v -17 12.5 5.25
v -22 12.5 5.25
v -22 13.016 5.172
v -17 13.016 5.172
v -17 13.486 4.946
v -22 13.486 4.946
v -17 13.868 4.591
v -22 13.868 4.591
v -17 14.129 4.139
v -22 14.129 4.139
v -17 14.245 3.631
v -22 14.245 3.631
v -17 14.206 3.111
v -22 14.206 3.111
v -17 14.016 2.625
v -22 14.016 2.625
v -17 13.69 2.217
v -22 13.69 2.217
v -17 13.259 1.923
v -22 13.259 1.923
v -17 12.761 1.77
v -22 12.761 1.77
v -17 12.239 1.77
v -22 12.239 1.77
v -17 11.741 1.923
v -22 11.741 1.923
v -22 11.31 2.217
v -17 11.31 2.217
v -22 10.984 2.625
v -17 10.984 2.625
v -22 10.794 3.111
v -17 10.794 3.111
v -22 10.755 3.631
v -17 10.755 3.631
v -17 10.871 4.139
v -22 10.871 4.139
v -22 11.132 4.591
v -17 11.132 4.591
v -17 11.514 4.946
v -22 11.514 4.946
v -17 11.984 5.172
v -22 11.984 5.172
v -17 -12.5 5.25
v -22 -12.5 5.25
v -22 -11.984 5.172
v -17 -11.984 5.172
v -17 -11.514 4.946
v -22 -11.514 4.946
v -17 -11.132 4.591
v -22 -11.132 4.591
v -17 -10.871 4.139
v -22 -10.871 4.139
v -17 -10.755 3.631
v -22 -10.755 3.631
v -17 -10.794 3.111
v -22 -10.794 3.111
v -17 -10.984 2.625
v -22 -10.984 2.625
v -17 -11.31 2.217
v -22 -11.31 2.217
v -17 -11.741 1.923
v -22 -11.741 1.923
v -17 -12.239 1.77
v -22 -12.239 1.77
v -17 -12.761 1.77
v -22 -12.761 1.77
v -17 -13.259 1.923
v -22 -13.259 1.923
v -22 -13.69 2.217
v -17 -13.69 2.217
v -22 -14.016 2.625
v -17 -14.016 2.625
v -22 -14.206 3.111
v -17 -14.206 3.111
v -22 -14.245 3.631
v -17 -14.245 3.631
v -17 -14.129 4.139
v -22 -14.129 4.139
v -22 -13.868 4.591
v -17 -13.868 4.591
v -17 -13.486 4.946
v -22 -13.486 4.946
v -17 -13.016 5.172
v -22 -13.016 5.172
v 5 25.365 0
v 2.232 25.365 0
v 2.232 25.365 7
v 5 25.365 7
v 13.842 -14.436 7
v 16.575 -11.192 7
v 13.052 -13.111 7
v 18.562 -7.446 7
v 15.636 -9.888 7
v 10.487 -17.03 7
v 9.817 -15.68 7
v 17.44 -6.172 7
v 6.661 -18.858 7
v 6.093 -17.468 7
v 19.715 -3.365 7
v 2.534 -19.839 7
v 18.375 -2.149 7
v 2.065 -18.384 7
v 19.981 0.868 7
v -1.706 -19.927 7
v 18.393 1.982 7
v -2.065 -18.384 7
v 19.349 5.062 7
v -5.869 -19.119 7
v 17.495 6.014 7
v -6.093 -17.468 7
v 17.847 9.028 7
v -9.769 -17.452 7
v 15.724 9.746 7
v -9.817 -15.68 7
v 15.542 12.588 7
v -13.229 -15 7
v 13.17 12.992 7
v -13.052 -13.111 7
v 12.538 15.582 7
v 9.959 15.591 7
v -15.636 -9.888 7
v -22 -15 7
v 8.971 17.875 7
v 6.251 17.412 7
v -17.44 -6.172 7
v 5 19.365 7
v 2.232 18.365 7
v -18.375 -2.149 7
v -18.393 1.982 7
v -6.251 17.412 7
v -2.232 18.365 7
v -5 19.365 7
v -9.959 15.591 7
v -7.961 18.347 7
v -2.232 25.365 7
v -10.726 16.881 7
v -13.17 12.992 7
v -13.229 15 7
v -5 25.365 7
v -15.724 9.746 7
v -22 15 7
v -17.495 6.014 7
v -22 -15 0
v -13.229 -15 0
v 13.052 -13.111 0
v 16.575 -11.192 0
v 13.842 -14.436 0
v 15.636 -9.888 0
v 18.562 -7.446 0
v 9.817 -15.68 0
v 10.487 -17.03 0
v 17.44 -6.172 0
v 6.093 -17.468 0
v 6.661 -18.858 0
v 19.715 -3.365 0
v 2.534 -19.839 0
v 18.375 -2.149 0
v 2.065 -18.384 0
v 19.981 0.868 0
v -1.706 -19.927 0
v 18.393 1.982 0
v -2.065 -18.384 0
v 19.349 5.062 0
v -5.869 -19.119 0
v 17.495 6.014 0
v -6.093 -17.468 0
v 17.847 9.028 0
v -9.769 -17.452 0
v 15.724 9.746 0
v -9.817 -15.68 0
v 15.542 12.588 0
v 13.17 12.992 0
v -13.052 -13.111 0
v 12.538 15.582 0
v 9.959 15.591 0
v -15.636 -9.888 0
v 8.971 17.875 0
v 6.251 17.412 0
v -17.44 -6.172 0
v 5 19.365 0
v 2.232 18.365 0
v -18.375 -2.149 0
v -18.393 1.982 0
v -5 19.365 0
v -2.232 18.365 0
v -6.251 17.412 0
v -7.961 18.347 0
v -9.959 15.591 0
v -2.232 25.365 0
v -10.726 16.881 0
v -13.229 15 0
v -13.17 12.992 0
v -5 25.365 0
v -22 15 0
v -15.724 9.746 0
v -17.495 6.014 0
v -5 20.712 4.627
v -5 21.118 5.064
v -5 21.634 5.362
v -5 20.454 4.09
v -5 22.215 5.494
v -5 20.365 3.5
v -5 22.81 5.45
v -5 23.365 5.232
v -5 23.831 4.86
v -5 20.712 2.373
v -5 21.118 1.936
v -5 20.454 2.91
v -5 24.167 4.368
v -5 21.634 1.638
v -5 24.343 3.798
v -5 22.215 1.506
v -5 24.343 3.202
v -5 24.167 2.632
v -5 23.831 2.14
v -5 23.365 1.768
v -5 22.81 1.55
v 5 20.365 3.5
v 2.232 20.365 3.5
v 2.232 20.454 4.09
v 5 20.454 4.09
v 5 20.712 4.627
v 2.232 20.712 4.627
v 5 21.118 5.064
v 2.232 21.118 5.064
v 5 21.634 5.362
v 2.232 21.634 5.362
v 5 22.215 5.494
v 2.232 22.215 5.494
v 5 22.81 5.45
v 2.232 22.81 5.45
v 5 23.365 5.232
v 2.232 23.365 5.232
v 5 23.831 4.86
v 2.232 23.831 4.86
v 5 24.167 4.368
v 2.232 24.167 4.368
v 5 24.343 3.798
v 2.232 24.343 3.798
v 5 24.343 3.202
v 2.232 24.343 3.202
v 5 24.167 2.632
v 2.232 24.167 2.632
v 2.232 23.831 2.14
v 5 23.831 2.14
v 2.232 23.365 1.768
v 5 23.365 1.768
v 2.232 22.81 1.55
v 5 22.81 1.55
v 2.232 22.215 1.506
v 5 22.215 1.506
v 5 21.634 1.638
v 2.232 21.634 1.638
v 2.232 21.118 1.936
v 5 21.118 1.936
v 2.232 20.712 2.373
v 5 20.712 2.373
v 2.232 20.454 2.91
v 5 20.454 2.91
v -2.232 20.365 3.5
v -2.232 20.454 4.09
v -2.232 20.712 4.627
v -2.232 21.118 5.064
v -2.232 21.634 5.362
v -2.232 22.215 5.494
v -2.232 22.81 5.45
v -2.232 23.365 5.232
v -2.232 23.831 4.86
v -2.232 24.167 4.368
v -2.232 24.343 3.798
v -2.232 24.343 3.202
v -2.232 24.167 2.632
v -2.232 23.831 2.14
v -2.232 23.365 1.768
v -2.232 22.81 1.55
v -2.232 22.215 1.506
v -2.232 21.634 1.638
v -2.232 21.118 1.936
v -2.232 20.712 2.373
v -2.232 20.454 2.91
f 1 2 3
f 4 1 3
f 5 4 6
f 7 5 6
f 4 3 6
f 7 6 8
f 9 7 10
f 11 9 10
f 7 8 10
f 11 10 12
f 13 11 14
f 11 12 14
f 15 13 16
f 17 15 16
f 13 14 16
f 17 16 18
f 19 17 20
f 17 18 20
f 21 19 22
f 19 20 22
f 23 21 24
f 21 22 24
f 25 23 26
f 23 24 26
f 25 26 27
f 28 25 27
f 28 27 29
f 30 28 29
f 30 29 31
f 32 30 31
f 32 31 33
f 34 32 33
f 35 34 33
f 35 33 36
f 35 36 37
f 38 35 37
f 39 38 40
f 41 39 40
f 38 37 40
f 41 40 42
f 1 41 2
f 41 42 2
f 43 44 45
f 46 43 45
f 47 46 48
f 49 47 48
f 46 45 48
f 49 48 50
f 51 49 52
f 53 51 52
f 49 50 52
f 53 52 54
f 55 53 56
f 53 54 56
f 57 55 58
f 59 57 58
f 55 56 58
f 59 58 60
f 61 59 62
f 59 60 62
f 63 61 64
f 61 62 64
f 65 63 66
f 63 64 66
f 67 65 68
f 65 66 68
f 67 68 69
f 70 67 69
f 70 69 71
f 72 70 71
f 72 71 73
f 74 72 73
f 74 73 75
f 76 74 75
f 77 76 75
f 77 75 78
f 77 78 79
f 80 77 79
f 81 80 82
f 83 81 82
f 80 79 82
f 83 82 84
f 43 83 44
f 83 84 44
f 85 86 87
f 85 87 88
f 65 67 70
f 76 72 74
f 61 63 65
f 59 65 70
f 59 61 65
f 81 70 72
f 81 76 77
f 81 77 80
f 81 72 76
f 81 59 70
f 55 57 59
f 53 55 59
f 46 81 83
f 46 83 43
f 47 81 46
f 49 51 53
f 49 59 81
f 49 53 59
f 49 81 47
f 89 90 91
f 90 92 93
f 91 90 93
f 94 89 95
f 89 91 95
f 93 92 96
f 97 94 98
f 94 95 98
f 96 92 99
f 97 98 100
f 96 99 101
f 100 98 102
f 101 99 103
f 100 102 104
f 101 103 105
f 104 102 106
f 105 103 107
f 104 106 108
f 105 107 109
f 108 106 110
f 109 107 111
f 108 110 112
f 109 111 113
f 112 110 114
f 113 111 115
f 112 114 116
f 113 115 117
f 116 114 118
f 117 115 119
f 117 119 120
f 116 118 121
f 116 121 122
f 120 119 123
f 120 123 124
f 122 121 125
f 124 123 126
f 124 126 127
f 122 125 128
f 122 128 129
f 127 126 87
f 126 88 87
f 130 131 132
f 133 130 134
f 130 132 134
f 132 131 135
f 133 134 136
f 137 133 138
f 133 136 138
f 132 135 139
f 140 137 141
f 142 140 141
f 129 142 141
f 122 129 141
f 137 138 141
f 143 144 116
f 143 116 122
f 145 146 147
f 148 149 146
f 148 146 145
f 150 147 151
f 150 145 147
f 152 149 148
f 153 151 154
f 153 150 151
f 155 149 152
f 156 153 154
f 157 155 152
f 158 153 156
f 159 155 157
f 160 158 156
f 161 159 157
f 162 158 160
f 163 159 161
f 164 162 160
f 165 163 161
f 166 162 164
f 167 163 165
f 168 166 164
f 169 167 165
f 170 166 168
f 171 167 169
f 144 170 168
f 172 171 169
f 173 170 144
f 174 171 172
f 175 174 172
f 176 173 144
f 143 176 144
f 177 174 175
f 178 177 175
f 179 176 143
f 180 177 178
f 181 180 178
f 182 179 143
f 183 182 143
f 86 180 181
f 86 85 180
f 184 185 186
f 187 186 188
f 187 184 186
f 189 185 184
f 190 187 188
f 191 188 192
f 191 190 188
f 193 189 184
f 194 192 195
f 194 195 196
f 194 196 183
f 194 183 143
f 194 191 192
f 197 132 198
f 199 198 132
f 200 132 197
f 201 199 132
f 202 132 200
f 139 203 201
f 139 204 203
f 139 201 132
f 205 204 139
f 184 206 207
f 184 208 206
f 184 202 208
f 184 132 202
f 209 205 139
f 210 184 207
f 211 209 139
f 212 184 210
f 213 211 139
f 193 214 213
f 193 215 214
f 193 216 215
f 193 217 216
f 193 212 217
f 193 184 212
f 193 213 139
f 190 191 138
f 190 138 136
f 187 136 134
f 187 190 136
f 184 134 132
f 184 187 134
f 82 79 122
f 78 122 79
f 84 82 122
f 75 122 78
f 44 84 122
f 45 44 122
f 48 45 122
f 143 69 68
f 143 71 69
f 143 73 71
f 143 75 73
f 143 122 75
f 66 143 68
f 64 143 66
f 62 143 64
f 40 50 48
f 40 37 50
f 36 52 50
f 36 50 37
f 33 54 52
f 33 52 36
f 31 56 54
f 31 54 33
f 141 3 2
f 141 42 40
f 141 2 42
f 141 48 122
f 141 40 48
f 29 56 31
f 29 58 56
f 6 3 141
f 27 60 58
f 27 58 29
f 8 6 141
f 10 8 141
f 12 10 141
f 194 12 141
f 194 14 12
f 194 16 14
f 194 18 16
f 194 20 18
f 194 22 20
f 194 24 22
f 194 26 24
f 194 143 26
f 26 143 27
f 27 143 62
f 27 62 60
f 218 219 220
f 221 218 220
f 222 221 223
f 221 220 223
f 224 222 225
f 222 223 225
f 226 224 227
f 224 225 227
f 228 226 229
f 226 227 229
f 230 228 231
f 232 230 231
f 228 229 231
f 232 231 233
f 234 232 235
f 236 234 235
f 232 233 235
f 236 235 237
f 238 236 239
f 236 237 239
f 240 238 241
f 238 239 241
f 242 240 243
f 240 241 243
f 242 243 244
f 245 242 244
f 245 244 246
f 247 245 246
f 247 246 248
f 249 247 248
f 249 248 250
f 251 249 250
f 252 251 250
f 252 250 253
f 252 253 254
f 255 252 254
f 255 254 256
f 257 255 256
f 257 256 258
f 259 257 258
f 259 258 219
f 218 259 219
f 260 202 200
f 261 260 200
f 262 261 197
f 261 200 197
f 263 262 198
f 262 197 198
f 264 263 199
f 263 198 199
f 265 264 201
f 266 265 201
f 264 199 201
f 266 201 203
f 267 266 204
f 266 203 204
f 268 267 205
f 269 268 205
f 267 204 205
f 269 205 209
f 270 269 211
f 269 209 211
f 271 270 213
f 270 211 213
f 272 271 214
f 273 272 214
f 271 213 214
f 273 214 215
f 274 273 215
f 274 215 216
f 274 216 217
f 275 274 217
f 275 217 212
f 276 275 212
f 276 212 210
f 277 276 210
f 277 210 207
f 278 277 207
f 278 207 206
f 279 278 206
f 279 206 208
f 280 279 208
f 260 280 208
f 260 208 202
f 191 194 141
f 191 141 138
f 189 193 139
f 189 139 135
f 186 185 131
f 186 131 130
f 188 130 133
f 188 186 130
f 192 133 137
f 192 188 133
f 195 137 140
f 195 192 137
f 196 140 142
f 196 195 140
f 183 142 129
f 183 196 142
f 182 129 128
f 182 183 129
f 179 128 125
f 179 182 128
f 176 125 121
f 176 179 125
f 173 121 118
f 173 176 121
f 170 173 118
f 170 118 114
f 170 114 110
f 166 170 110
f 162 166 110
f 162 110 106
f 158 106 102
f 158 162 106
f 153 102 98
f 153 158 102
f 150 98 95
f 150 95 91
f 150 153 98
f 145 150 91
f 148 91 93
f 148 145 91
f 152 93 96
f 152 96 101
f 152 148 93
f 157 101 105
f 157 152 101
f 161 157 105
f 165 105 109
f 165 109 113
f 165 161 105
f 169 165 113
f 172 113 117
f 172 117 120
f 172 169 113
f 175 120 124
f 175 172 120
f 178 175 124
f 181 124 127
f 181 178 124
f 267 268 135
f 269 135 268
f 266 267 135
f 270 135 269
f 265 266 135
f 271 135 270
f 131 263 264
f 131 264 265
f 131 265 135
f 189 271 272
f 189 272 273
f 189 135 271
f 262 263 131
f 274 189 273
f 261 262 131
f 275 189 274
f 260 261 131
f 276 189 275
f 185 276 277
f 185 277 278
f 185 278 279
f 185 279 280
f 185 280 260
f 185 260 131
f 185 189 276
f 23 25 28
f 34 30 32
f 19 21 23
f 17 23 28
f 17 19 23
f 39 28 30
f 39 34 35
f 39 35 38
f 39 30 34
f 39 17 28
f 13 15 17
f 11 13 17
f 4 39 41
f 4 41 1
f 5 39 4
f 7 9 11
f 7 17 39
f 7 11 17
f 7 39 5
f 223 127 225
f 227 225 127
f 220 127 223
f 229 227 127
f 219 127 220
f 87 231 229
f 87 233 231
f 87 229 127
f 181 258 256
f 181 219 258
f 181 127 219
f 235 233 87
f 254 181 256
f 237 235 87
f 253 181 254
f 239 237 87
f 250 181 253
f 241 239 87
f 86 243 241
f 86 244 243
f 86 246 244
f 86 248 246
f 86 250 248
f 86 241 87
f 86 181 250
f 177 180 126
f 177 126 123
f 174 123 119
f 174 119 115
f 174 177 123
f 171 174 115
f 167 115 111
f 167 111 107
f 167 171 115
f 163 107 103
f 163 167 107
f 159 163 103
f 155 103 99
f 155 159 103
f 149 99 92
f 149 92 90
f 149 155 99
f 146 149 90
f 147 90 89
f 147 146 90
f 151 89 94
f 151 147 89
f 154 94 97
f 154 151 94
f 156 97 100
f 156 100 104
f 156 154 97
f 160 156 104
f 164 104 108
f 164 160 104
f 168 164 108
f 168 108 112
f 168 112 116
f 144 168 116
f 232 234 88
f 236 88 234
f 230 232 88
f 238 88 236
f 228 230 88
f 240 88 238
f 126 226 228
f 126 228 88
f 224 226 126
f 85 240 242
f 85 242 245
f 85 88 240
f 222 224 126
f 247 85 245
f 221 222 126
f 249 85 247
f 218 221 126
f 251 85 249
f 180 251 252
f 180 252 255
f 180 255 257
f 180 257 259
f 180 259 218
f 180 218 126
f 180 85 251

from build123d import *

# Parameters (mm, degrees)
BOSS_EXTRUDE1_DEPTH = 7
SKETCH2_R           = 1.75
CUT_EXTRUDE2_DEPTH  = 5
SKETCH3_R           = 2
CUT_EXTRUDE3_DEPTH  = 15


with BuildPart() as part:
    # Sketch1 → Boss-Extrude1 (new body)
    with BuildSketch(Plane.XY):
        with BuildLine():
            Line((-22, -15), (-22, 15))
            Line((-22, 15), (-13.228756555, 15))
            ThreePointArc((-13.228756555, 15), (-9.372033712, 17.668191308), (-5, 19.364916731))
            Line((-5, 19.364916731), (-5, 25.364916731))
            Line((-5, 25.364916731), (-2.231554046, 25.364916731))
            Line((-2.231554046, 25.364916731), (-2.231554046, 18.364916731))
            ThreePointArc((-2.231554046, 18.364916731), (0, -18.5), (2.231554046, 18.364916731))
            Line((2.231554046, 18.364916731), (2.231554046, 25.364916731))
            Line((2.231554046, 25.364916731), (5, 25.364916731))
            Line((5, 25.364916731), (5, 19.364916731))
            ThreePointArc((5, 19.364916731), (17.668191308, -9.372033712), (-13.228756555, -15))
            Line((-13.228756555, -15), (-22, -15))
        make_face()
    extrude(amount=BOSS_EXTRUDE1_DEPTH)

    # Sketch2 → Cut-Extrude2 (cut)
    with BuildSketch(Plane.ZY.offset(22)):
        with Locations((3.5, 12.5)):
            Circle(SKETCH2_R)
        with Locations((3.5, -12.5)):
            Circle(SKETCH2_R)
    extrude(amount=-CUT_EXTRUDE2_DEPTH, mode=Mode.SUBTRACT)

    # Sketch3 → Cut-Extrude3 (cut)
    with BuildSketch(Plane.ZY.offset(5)):
        with Locations(Location((3.5, 22.364916731, 0), (0, 0, 270))):
            Circle(SKETCH3_R)
    extrude(amount=-CUT_EXTRUDE3_DEPTH, mode=Mode.SUBTRACT)


solid = part.part
